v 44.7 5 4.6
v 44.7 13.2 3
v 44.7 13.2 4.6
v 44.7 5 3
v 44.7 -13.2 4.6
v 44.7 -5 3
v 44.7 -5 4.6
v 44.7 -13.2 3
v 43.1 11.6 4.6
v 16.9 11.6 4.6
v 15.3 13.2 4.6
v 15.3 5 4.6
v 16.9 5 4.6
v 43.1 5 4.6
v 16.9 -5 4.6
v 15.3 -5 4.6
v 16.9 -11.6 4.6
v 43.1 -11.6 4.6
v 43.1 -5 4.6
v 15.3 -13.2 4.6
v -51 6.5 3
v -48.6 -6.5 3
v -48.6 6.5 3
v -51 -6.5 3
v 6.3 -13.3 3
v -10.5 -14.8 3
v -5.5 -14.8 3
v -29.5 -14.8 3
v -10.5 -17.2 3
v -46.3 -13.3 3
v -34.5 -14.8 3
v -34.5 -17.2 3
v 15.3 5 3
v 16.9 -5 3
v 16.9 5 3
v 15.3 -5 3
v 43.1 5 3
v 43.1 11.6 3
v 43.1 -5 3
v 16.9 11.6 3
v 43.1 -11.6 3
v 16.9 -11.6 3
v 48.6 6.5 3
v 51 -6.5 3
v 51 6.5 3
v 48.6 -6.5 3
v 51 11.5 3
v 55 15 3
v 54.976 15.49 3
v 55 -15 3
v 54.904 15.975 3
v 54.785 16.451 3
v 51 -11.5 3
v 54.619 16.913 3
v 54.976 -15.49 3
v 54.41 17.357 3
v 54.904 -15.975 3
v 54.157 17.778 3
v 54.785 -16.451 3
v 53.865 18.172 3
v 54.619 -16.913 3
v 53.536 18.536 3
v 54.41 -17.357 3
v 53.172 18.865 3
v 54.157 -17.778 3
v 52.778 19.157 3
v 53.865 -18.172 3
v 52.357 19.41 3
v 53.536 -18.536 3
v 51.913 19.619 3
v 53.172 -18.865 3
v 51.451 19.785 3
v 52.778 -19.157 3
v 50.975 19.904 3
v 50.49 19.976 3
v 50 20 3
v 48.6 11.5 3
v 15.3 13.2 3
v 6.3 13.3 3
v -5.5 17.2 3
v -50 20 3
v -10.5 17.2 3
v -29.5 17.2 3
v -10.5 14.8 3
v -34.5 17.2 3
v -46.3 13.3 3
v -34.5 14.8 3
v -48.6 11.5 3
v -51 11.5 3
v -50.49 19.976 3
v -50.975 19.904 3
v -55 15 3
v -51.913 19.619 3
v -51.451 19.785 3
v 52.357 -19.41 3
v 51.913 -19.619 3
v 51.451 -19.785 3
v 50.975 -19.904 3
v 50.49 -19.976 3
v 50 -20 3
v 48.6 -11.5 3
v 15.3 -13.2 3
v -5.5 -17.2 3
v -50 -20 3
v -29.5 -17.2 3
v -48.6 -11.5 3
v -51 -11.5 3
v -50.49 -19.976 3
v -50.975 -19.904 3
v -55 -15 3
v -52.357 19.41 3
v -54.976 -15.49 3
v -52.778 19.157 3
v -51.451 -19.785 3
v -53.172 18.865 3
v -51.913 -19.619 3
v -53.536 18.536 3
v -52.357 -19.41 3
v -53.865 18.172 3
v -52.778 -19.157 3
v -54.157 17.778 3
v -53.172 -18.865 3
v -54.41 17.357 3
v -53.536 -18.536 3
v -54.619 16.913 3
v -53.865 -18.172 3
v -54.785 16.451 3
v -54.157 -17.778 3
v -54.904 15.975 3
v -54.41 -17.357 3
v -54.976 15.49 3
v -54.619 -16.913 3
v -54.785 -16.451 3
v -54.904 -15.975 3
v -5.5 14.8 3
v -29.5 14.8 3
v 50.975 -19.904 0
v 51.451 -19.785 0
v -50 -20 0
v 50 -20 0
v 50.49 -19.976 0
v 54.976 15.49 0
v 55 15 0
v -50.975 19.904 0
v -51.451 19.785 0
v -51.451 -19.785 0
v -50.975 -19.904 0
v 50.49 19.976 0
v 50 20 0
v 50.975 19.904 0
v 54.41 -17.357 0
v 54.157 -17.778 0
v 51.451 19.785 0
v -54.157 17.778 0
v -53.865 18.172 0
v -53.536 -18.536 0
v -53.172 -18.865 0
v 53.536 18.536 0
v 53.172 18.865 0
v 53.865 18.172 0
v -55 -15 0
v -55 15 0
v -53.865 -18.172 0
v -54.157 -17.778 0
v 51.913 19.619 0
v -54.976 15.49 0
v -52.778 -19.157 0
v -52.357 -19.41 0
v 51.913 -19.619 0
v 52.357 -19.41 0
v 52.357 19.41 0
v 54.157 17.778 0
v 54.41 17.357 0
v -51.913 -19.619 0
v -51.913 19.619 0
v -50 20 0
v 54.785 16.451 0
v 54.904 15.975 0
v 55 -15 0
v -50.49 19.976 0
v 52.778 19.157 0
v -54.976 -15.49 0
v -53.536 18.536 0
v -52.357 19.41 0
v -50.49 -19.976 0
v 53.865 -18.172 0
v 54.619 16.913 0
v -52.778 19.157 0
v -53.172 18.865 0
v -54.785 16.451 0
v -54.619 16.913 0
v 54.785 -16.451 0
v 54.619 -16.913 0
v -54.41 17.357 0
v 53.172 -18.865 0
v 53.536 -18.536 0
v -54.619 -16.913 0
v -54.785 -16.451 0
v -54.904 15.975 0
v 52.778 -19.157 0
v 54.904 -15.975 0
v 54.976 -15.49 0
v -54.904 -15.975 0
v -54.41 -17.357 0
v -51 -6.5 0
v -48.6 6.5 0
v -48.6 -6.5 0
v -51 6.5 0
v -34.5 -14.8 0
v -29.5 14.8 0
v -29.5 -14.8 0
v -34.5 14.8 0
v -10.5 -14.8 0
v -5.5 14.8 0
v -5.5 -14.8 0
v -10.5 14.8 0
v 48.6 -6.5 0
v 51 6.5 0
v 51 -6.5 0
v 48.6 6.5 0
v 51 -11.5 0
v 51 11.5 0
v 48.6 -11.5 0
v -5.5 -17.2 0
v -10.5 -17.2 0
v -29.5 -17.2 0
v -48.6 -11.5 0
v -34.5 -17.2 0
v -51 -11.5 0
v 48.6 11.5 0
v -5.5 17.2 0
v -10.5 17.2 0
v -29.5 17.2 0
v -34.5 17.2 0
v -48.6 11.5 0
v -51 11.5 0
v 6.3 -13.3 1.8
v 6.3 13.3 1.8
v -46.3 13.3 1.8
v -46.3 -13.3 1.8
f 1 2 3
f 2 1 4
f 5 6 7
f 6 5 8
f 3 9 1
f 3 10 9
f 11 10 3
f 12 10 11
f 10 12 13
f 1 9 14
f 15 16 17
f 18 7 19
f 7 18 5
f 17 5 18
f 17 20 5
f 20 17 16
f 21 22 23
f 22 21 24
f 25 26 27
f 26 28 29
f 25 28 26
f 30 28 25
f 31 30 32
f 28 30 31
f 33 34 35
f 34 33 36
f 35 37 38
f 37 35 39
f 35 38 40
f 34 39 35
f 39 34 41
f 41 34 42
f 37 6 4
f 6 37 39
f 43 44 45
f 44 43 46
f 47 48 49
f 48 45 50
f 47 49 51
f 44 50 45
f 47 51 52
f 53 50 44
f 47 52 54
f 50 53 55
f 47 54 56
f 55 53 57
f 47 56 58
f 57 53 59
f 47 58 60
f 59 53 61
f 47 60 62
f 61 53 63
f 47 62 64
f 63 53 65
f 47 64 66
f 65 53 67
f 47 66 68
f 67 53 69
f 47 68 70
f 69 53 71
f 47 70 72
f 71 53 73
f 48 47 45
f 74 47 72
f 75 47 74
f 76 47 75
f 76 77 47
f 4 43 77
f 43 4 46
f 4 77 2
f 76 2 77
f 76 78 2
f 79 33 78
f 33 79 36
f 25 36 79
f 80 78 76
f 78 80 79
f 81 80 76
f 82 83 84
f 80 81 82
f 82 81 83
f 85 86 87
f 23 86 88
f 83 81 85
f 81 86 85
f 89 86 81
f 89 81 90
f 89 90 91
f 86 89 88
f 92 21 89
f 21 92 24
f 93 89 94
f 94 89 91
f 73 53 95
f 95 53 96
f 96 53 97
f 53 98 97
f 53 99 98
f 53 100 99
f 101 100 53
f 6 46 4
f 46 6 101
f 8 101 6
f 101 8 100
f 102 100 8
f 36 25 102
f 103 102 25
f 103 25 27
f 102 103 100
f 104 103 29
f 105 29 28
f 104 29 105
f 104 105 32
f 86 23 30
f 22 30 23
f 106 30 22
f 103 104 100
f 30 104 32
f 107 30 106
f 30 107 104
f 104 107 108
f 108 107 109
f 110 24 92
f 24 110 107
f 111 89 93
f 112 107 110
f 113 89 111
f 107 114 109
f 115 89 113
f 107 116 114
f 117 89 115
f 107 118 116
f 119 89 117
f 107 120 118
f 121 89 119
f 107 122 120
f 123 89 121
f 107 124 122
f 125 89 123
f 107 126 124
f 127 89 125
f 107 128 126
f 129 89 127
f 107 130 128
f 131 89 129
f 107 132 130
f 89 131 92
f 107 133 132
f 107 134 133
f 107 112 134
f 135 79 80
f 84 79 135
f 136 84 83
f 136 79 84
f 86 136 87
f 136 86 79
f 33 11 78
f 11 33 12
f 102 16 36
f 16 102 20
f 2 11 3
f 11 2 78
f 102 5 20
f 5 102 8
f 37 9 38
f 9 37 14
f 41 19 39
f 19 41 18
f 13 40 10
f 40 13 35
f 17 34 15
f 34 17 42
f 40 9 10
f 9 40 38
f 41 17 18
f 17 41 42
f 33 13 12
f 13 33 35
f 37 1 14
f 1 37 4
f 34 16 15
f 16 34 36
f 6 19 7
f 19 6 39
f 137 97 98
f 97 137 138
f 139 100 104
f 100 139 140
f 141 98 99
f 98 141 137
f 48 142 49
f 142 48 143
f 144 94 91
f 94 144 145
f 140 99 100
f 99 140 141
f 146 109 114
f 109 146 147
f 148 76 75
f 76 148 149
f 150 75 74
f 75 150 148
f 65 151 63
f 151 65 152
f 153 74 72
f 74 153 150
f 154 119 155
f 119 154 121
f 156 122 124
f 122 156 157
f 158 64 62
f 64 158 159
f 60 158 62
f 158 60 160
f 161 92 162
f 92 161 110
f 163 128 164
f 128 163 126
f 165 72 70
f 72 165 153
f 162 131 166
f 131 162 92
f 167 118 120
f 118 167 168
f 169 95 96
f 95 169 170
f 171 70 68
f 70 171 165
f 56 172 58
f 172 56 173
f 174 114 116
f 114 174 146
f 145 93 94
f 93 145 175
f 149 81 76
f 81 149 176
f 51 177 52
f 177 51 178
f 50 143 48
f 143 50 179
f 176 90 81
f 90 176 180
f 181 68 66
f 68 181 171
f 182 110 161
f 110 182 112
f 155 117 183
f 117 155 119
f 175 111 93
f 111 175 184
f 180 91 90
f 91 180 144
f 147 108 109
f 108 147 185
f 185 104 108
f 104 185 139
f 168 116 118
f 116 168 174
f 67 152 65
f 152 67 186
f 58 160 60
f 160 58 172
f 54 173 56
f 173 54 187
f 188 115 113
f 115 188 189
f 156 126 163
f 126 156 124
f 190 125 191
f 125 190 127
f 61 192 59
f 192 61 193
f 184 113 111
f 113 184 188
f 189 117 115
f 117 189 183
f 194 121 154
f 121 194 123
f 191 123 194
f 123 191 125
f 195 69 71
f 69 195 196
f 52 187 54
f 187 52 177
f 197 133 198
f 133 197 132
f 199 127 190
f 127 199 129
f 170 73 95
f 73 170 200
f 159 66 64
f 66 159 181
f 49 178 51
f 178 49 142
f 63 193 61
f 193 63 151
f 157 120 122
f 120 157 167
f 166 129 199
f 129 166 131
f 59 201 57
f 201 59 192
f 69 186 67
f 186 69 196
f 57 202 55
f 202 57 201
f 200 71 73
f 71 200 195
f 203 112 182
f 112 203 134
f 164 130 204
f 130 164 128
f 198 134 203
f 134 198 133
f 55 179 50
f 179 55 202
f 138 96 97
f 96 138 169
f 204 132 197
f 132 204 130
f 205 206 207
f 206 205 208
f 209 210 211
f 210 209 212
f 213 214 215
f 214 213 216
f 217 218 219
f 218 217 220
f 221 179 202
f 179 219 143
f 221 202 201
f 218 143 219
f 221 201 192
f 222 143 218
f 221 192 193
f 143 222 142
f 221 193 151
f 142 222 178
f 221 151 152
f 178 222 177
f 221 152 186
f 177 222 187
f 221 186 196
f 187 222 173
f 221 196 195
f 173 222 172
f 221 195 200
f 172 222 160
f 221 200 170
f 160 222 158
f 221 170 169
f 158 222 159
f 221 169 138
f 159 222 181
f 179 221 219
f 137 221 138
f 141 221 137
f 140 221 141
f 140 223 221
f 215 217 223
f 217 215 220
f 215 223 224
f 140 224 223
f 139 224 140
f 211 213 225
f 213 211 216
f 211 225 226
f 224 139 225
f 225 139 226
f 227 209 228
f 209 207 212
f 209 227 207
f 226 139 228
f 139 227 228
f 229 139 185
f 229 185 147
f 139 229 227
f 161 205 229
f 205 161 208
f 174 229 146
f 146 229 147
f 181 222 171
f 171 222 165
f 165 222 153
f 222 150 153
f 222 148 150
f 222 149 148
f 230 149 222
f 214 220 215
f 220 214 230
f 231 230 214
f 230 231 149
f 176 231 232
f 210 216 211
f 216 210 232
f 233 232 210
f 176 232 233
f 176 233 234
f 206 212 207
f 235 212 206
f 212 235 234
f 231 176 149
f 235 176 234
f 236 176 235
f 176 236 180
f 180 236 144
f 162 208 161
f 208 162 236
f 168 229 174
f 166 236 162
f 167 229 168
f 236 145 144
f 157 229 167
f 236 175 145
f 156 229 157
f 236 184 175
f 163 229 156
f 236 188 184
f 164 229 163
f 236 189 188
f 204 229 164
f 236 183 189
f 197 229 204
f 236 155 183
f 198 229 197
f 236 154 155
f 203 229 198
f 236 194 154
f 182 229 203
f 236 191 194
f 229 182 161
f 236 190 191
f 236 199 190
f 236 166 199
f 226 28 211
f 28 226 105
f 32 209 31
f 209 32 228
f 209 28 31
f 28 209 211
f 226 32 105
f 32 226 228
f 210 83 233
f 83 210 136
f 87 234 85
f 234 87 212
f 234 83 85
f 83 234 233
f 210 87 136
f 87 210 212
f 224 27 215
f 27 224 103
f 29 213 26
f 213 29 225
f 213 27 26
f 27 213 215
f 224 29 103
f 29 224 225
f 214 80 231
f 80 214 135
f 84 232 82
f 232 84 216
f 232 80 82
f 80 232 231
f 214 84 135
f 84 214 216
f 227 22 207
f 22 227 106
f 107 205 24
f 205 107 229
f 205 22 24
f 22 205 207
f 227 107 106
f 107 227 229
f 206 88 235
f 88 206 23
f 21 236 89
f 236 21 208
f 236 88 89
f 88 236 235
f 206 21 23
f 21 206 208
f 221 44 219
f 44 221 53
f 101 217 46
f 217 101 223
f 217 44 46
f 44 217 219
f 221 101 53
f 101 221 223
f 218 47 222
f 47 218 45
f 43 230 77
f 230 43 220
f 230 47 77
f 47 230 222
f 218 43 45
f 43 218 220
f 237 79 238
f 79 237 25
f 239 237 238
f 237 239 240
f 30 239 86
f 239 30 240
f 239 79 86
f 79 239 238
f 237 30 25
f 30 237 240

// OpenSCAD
// =====================================================================================
//  No-drill trunk-lid tray for the emblem display electronics
//  Holds: DROK 12V->5V 3A buck converter (51 x 25 x 21 mm incl. feet) + INA219 (GY-219, 25 x 22 mm)
//  Mounts with 3M VHB on the flat back, and/or zip ties around the existing trunk-lid wiring harness.
//  Units: mm. Print flat, back down, no supports.
// =====================================================================================

/* [Tray] */
plate_l = 110;
plate_w = 40;
plate_t = 3;
corner_r = 5;

/* [Buck converter] */
// Footprint of the converter's feet (length x width)
conv_l = 51;
conv_w = 25;
// Clearance around the converter footprint
conv_clear = 0.8;
// Depth of the locating pocket for the converter feet
conv_pocket = 1.2;
// Centre of the converter along the tray
conv_x = -20;
// Distance between the two zip-tie straps over the converter
strap_spacing = 24;

/* [INA219 board] */
ina_l = 25;
ina_w = 22;
ina_clear = 0.6;
// Height of the low wall around the INA219
ina_wall_h = 1.6;
ina_wall_t = 1.6;
// Width of the wire gaps in the short walls
ina_gap = 10;
ina_x = 30;

/* [Zip ties] */
// Zip-tie width + clearance
tie_w = 5.0;
// Zip-tie thickness + clearance
tie_t = 2.4;
// Distance from tray end to the end slots (for strapping to a harness)
end_slot_inset = 4;
// Spacing of the two end slots across the tray
end_slot_spacing = 18;

/* [Hidden] */
$fn = 64;
CPL = conv_l + 2 * conv_clear;
CPW = conv_w + 2 * conv_clear;
IPL = ina_l + 2 * ina_clear;
IPW = ina_w + 2 * ina_clear;

module rounded_rect(l, w, r, h) {
    linear_extrude(height = h)
        offset(r = r) square([l - 2 * r, w - 2 * r], center = true);
}

module slot_x(cx, cy) { translate([cx - tie_w / 2, cy - tie_t / 2, -1]) cube([tie_w, tie_t, plate_t + 2]); }  // tie runs across Y
module slot_y(cx, cy) { translate([cx - tie_t / 2, cy - tie_w / 2, -1]) cube([tie_t, tie_w, plate_t + 2]); }  // tie runs across X

module tray() {
    difference() {
        union() {
            rounded_rect(plate_l, plate_w, corner_r, plate_t);
            // low wall around the INA219 with wire gaps in the short sides
            translate([ina_x, 0, plate_t]) difference() {
                translate([-(IPL / 2 + ina_wall_t), -(IPW / 2 + ina_wall_t), 0])
                    cube([IPL + 2 * ina_wall_t, IPW + 2 * ina_wall_t, ina_wall_h]);
                translate([-IPL / 2, -IPW / 2, -1]) cube([IPL, IPW, ina_wall_h + 2]);
                translate([-(IPL / 2 + ina_wall_t + 1), -ina_gap / 2, -1]) cube([IPL + 2 * ina_wall_t + 2, ina_gap, ina_wall_h + 2]);
            }
        }
        // locating pocket for the converter feet
        translate([conv_x - CPL / 2, -CPW / 2, plate_t - conv_pocket]) cube([CPL, CPW, conv_pocket + 1]);
        // two straps over the converter body
        for (dx = [-strap_spacing / 2, strap_spacing / 2]) for (sy = [-1, 1])
            slot_x(conv_x + dx, sy * (CPW / 2 + tie_t / 2 + 1.5));
        // end slots: zip-tie the tray to a harness or bracket behind it
        for (sx = [-1, 1]) for (sy = [-1, 1])
            slot_y(sx * (plate_l / 2 - end_slot_inset - tie_t / 2), sy * end_slot_spacing / 2);
    }
}

tray();
